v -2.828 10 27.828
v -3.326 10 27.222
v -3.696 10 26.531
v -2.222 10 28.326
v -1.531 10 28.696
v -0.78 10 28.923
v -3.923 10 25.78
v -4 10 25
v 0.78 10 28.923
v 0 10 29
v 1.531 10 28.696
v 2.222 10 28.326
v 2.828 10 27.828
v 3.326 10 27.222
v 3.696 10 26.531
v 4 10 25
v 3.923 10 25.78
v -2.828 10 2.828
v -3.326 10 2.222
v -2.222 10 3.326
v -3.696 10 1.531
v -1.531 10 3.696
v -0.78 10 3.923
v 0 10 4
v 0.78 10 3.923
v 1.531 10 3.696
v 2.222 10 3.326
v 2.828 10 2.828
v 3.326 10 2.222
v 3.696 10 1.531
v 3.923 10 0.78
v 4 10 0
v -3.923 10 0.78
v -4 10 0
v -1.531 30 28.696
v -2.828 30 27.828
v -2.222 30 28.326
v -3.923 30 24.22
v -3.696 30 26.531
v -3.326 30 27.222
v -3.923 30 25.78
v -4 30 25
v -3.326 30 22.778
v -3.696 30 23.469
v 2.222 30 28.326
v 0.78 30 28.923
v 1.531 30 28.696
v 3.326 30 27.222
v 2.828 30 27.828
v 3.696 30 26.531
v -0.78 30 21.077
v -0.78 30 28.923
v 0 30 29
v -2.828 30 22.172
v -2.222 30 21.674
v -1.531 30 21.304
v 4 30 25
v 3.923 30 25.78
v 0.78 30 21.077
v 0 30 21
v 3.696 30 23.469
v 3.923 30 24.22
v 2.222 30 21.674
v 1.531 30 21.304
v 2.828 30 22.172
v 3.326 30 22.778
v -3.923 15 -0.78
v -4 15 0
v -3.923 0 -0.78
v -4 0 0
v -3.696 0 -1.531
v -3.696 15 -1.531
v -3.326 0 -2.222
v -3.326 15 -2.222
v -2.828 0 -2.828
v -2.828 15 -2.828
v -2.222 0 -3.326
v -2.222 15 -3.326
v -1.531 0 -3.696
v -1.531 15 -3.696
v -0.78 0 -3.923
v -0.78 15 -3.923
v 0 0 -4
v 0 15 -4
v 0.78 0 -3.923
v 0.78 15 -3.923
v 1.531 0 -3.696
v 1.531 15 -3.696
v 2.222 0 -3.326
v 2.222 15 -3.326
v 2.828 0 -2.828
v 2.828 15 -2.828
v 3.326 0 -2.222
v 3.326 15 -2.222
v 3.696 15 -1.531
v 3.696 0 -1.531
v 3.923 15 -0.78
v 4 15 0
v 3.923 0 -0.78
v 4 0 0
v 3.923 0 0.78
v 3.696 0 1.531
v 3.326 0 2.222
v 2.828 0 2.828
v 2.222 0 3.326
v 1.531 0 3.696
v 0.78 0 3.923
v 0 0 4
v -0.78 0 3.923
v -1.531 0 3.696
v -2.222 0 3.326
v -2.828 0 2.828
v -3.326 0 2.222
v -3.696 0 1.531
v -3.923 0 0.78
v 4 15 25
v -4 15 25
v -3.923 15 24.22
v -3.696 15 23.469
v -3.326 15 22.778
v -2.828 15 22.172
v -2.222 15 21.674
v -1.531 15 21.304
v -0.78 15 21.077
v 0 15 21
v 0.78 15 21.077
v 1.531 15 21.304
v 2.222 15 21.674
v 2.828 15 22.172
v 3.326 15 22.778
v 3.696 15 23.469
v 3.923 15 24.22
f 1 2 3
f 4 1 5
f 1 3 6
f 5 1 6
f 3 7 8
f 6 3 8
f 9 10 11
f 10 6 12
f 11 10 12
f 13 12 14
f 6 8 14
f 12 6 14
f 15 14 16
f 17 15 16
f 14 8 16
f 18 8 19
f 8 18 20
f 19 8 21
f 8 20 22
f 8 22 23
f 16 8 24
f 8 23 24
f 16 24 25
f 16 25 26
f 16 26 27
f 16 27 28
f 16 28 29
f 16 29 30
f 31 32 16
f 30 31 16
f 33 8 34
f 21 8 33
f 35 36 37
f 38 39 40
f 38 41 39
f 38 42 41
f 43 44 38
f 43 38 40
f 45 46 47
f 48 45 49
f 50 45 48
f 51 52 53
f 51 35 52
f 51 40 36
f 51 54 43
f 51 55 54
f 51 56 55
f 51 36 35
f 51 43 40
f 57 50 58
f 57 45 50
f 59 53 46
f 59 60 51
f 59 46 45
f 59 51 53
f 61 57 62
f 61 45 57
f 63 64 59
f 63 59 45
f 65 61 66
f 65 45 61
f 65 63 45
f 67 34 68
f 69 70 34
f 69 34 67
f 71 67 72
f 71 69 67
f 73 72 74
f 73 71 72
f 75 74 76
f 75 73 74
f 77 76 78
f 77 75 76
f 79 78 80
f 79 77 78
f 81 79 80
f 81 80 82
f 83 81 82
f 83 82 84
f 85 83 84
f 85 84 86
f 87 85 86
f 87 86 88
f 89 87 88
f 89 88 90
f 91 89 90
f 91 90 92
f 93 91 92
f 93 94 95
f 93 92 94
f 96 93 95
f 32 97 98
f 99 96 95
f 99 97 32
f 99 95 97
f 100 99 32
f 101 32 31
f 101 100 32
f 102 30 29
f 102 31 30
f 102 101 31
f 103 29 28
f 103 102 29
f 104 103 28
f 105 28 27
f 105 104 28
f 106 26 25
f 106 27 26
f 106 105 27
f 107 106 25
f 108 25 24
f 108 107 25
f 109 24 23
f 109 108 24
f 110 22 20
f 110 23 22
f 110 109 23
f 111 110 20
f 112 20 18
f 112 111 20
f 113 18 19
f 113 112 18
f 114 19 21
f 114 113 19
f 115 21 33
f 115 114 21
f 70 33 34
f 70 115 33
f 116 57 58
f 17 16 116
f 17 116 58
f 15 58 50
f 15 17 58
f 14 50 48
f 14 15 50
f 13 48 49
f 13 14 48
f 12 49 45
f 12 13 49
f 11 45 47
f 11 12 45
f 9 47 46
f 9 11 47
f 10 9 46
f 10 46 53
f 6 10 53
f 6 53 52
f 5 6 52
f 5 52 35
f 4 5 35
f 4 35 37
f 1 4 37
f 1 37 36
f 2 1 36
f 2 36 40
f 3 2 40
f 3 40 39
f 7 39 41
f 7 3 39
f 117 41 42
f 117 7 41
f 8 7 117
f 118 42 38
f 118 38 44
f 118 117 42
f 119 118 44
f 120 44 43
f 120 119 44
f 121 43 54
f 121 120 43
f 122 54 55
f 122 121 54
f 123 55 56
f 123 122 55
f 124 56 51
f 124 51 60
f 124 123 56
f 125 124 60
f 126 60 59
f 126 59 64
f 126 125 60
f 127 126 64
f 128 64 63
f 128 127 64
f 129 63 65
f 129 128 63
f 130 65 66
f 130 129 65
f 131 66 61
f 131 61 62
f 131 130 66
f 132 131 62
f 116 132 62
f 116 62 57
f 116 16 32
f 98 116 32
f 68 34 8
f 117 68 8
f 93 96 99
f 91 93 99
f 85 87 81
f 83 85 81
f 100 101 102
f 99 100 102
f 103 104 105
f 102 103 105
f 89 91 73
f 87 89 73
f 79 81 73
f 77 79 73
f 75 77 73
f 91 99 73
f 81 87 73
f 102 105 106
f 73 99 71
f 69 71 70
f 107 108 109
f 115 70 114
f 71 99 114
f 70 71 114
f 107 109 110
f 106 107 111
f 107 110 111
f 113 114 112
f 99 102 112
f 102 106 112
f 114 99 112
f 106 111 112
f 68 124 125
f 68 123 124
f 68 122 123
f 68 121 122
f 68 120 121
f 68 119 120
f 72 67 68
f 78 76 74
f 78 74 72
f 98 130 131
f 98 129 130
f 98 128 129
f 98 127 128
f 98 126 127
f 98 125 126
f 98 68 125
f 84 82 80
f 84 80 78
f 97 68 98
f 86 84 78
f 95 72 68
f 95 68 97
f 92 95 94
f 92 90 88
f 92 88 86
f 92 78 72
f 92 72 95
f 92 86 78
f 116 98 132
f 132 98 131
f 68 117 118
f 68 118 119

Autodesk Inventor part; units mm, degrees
ref_plane "YZ Plane" through (0, 0, 0) normal (1, 0, 0) x (0, 1, 0)
ref_plane "XZ Plane" through (0, 0, 0) normal (0, 1, 0) x (-1, 0, 0)
ref_plane "XY Plane" through (0, 0, 0) normal (0, 0, 1) x (1, 0, 0)
sketch "Sketch1" plane through (0, 0, 0) normal (0, 1, 0) x (-1, 0, 0)
  circle A0 centre (0, 0) radius 4
  dimension "d0" = 8
extrude "Extrusion1" add sketch "Sketch1" along normal blind 10
sketch "Sketch2" plane through (0, 10, 0) normal (0, 1, 0) x (1, 0, 0)
  circle A0 centre (0, 0) radius 4
  line L0 (4, 0) -> (-4, 0)
  line L1 (-4, 0) -> (-4, -25)
  line L2 (-4, -25) -> (4, -25)
  line L3 (4, -25) -> (4, 0)
  circle A1 centre (0, -25) radius 4
  dimension "d3" = 25
extrude "Extrusion2" add sketch "Sketch2" along normal blind 5
sketch "Sketch3" plane through (0, 15, 0) normal (0, 1, 0) x (1, 0, 0)
  arc A0 (-4, -25) -> (4, -25) centre (0, -25) ccw projected
  circle A1 centre (0, -25) radius 4
  point P0 (0, 0)
extrude "Extrusion3" add sketch "Sketch3" along normal blind 15
properties part number "Vevarm"
